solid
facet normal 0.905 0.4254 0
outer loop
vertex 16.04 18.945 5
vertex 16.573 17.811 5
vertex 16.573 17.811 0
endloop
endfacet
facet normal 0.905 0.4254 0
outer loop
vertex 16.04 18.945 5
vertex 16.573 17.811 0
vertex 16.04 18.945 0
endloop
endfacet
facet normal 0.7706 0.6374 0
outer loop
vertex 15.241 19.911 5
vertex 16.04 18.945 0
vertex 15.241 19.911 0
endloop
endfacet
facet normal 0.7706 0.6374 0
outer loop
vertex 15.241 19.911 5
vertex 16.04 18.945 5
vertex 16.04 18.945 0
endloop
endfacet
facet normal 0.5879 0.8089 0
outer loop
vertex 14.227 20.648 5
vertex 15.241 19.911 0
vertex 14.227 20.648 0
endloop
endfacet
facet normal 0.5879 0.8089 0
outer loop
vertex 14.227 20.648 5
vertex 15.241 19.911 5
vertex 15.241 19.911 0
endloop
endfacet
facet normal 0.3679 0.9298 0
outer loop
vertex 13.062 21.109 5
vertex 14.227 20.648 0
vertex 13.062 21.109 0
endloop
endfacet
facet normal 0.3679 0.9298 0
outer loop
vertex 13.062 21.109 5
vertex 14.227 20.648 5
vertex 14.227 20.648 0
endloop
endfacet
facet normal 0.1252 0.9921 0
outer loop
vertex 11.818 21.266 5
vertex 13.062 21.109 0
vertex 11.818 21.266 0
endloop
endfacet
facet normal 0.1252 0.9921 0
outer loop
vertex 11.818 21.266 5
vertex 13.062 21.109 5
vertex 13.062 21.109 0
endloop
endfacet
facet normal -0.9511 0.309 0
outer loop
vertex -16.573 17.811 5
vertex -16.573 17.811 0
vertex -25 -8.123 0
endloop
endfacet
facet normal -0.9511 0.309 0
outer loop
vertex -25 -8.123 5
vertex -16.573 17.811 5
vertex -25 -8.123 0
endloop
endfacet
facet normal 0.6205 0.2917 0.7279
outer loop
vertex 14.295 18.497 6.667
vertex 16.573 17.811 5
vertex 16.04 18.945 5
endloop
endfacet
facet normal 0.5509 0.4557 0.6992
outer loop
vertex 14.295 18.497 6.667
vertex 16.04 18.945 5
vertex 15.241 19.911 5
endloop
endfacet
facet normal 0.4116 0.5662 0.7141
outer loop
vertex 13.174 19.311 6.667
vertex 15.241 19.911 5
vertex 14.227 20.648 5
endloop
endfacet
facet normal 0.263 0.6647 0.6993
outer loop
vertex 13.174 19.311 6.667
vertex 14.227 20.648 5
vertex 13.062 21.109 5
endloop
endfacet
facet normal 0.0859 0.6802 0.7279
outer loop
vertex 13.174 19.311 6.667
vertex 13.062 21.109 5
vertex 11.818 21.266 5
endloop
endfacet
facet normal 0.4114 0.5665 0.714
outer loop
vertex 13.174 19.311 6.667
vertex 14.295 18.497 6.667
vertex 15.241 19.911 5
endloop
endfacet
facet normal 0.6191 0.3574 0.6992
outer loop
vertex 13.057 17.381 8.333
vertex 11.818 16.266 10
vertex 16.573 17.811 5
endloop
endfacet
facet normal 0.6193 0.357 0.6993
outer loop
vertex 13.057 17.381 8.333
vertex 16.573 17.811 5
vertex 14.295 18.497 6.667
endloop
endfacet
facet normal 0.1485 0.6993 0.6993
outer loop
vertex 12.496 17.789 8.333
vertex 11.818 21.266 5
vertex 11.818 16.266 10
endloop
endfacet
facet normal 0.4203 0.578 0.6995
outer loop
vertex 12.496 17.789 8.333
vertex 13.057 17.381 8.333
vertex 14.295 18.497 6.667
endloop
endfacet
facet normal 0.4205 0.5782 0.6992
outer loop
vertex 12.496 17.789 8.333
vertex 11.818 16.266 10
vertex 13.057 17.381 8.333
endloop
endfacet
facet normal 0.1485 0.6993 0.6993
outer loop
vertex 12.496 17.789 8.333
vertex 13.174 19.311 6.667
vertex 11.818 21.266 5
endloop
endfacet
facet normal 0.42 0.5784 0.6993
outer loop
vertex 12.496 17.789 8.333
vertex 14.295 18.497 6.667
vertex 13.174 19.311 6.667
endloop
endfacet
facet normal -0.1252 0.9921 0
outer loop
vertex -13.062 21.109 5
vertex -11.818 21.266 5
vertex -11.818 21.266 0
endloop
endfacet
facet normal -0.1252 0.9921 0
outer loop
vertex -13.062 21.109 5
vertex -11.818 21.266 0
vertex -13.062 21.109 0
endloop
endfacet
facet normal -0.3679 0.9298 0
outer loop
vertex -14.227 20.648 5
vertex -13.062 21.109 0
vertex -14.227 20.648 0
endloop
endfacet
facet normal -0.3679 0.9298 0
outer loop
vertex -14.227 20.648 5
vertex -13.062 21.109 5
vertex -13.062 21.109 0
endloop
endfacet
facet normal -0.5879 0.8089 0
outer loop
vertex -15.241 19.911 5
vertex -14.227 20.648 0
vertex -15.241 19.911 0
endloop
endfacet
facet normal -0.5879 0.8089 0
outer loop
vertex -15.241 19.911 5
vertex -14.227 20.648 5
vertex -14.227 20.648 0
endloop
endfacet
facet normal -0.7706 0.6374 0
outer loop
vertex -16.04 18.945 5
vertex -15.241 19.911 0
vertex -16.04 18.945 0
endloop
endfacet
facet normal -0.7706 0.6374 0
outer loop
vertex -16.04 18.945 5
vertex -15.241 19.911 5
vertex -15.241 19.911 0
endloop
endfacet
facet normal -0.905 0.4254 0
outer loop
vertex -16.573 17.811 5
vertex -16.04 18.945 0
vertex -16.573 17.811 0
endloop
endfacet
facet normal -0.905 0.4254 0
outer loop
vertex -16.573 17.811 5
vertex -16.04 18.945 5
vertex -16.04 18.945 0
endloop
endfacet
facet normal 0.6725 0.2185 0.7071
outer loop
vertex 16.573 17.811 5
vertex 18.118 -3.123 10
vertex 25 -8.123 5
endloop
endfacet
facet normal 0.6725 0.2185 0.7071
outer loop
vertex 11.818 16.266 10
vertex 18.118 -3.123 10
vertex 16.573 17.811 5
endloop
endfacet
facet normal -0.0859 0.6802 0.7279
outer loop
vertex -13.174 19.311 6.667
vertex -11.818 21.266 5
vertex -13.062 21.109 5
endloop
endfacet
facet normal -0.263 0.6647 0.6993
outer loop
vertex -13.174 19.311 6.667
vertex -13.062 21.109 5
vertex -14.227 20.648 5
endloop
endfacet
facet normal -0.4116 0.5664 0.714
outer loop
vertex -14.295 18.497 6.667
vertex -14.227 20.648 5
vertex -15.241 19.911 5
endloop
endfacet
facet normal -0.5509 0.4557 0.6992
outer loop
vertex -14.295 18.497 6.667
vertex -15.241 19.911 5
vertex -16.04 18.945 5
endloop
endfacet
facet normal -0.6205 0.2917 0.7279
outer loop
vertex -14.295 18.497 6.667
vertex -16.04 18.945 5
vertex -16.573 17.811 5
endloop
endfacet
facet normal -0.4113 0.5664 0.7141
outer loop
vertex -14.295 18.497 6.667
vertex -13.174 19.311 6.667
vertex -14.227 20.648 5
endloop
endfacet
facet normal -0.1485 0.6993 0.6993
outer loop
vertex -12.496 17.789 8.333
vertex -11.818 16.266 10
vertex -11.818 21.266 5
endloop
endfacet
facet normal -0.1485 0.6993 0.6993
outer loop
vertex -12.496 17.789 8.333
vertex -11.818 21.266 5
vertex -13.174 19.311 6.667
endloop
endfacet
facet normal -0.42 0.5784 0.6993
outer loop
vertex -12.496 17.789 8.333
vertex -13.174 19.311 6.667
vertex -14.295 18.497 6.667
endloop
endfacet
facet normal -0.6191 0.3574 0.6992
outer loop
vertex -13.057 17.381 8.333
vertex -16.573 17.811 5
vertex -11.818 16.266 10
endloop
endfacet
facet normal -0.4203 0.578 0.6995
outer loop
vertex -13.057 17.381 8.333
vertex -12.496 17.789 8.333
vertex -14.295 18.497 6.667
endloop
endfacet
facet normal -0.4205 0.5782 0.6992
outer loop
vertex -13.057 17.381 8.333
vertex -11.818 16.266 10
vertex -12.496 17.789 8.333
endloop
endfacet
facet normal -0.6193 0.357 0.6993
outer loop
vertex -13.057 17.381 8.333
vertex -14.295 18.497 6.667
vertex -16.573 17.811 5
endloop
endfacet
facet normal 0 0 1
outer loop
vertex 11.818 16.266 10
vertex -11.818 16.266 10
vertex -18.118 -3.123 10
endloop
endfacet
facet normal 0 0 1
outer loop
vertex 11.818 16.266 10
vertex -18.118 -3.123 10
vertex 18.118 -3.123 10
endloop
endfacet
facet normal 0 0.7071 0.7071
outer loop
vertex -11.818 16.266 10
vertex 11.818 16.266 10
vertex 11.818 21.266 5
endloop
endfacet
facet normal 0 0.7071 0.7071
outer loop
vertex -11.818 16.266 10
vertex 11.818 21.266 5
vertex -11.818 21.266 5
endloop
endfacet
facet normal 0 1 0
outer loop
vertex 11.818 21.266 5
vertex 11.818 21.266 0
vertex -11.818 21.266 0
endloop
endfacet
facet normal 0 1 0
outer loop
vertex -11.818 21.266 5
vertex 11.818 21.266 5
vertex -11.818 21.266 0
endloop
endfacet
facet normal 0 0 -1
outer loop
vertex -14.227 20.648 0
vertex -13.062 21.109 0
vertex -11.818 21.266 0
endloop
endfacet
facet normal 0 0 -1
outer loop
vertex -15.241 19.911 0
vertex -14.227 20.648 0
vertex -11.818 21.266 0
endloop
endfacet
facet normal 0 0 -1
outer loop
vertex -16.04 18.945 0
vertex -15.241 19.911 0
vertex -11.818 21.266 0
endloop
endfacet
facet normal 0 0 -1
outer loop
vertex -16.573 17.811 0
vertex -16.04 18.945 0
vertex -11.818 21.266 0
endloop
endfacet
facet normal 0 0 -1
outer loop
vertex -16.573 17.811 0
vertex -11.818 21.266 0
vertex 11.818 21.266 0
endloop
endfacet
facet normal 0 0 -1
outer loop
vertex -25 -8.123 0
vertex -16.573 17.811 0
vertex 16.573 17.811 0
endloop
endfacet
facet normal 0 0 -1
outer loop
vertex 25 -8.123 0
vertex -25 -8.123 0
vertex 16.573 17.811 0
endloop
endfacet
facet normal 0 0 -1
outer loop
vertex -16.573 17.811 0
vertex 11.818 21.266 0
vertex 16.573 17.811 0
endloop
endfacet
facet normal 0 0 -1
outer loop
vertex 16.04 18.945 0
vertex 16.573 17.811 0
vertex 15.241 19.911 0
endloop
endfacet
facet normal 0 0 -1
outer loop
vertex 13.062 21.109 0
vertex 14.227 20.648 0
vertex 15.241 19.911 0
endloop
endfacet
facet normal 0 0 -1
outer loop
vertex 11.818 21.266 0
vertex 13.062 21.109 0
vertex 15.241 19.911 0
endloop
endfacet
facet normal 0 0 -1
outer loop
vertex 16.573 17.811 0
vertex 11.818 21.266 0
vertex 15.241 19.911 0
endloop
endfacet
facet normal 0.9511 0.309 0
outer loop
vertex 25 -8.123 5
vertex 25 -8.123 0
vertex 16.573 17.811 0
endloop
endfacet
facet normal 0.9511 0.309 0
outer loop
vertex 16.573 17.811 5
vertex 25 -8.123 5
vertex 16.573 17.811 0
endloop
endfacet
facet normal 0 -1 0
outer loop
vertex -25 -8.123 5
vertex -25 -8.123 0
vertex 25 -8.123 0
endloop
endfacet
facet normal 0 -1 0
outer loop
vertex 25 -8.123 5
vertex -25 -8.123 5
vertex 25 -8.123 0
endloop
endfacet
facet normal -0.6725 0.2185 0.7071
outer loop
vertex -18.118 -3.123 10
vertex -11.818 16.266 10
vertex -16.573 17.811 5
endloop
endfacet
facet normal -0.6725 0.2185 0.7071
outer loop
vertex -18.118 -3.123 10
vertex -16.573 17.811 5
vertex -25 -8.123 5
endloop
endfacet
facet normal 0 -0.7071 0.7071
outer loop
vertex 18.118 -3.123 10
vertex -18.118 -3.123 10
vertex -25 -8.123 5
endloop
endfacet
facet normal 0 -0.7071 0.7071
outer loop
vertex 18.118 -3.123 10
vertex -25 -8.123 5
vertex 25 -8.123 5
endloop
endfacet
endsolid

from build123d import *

# Parameters (mm, degrees)
F1_DEPTH = 10
F2_R     = 5
F3_R     = 5
F4_SIZE  = 5


with BuildPart() as f1:
    # F0 (on Top) → F1 (new body)
    with BuildSketch(Plane.XY):
        Polygon((-15.45085, 21.26627), (-25, -8.122992), (25, -8.122992), (15.45085, 21.26627), align=None)
    extrude(amount=F1_DEPTH)

    # F2
    f2_edges = [f1.edges().sort_by_distance(p)[0] for p in [
        (15.45085, 21.26627, 5),
    ]]
    fillet(f2_edges, radius=F2_R)

    # F3
    f3_edges = [f1.edges().sort_by_distance(p)[0] for p in [
        (-15.45085, 21.26627, 5),
    ]]
    fillet(f3_edges, radius=F3_R)

    # F4
    f4_edges = [f1.edges().sort_by_distance(p)[0] for p in [
        (0, 21.26627, 10),
        (-14.757063, 20.311355, 10),
        (14.757063, 20.311355, 10),
        (-20.78671, 4.844181, 10),
        (20.78671, 4.844181, 10),
        (0, -8.122992, 10),
    ]]
    chamfer(f4_edges, length=F4_SIZE)


solid = f1.part
